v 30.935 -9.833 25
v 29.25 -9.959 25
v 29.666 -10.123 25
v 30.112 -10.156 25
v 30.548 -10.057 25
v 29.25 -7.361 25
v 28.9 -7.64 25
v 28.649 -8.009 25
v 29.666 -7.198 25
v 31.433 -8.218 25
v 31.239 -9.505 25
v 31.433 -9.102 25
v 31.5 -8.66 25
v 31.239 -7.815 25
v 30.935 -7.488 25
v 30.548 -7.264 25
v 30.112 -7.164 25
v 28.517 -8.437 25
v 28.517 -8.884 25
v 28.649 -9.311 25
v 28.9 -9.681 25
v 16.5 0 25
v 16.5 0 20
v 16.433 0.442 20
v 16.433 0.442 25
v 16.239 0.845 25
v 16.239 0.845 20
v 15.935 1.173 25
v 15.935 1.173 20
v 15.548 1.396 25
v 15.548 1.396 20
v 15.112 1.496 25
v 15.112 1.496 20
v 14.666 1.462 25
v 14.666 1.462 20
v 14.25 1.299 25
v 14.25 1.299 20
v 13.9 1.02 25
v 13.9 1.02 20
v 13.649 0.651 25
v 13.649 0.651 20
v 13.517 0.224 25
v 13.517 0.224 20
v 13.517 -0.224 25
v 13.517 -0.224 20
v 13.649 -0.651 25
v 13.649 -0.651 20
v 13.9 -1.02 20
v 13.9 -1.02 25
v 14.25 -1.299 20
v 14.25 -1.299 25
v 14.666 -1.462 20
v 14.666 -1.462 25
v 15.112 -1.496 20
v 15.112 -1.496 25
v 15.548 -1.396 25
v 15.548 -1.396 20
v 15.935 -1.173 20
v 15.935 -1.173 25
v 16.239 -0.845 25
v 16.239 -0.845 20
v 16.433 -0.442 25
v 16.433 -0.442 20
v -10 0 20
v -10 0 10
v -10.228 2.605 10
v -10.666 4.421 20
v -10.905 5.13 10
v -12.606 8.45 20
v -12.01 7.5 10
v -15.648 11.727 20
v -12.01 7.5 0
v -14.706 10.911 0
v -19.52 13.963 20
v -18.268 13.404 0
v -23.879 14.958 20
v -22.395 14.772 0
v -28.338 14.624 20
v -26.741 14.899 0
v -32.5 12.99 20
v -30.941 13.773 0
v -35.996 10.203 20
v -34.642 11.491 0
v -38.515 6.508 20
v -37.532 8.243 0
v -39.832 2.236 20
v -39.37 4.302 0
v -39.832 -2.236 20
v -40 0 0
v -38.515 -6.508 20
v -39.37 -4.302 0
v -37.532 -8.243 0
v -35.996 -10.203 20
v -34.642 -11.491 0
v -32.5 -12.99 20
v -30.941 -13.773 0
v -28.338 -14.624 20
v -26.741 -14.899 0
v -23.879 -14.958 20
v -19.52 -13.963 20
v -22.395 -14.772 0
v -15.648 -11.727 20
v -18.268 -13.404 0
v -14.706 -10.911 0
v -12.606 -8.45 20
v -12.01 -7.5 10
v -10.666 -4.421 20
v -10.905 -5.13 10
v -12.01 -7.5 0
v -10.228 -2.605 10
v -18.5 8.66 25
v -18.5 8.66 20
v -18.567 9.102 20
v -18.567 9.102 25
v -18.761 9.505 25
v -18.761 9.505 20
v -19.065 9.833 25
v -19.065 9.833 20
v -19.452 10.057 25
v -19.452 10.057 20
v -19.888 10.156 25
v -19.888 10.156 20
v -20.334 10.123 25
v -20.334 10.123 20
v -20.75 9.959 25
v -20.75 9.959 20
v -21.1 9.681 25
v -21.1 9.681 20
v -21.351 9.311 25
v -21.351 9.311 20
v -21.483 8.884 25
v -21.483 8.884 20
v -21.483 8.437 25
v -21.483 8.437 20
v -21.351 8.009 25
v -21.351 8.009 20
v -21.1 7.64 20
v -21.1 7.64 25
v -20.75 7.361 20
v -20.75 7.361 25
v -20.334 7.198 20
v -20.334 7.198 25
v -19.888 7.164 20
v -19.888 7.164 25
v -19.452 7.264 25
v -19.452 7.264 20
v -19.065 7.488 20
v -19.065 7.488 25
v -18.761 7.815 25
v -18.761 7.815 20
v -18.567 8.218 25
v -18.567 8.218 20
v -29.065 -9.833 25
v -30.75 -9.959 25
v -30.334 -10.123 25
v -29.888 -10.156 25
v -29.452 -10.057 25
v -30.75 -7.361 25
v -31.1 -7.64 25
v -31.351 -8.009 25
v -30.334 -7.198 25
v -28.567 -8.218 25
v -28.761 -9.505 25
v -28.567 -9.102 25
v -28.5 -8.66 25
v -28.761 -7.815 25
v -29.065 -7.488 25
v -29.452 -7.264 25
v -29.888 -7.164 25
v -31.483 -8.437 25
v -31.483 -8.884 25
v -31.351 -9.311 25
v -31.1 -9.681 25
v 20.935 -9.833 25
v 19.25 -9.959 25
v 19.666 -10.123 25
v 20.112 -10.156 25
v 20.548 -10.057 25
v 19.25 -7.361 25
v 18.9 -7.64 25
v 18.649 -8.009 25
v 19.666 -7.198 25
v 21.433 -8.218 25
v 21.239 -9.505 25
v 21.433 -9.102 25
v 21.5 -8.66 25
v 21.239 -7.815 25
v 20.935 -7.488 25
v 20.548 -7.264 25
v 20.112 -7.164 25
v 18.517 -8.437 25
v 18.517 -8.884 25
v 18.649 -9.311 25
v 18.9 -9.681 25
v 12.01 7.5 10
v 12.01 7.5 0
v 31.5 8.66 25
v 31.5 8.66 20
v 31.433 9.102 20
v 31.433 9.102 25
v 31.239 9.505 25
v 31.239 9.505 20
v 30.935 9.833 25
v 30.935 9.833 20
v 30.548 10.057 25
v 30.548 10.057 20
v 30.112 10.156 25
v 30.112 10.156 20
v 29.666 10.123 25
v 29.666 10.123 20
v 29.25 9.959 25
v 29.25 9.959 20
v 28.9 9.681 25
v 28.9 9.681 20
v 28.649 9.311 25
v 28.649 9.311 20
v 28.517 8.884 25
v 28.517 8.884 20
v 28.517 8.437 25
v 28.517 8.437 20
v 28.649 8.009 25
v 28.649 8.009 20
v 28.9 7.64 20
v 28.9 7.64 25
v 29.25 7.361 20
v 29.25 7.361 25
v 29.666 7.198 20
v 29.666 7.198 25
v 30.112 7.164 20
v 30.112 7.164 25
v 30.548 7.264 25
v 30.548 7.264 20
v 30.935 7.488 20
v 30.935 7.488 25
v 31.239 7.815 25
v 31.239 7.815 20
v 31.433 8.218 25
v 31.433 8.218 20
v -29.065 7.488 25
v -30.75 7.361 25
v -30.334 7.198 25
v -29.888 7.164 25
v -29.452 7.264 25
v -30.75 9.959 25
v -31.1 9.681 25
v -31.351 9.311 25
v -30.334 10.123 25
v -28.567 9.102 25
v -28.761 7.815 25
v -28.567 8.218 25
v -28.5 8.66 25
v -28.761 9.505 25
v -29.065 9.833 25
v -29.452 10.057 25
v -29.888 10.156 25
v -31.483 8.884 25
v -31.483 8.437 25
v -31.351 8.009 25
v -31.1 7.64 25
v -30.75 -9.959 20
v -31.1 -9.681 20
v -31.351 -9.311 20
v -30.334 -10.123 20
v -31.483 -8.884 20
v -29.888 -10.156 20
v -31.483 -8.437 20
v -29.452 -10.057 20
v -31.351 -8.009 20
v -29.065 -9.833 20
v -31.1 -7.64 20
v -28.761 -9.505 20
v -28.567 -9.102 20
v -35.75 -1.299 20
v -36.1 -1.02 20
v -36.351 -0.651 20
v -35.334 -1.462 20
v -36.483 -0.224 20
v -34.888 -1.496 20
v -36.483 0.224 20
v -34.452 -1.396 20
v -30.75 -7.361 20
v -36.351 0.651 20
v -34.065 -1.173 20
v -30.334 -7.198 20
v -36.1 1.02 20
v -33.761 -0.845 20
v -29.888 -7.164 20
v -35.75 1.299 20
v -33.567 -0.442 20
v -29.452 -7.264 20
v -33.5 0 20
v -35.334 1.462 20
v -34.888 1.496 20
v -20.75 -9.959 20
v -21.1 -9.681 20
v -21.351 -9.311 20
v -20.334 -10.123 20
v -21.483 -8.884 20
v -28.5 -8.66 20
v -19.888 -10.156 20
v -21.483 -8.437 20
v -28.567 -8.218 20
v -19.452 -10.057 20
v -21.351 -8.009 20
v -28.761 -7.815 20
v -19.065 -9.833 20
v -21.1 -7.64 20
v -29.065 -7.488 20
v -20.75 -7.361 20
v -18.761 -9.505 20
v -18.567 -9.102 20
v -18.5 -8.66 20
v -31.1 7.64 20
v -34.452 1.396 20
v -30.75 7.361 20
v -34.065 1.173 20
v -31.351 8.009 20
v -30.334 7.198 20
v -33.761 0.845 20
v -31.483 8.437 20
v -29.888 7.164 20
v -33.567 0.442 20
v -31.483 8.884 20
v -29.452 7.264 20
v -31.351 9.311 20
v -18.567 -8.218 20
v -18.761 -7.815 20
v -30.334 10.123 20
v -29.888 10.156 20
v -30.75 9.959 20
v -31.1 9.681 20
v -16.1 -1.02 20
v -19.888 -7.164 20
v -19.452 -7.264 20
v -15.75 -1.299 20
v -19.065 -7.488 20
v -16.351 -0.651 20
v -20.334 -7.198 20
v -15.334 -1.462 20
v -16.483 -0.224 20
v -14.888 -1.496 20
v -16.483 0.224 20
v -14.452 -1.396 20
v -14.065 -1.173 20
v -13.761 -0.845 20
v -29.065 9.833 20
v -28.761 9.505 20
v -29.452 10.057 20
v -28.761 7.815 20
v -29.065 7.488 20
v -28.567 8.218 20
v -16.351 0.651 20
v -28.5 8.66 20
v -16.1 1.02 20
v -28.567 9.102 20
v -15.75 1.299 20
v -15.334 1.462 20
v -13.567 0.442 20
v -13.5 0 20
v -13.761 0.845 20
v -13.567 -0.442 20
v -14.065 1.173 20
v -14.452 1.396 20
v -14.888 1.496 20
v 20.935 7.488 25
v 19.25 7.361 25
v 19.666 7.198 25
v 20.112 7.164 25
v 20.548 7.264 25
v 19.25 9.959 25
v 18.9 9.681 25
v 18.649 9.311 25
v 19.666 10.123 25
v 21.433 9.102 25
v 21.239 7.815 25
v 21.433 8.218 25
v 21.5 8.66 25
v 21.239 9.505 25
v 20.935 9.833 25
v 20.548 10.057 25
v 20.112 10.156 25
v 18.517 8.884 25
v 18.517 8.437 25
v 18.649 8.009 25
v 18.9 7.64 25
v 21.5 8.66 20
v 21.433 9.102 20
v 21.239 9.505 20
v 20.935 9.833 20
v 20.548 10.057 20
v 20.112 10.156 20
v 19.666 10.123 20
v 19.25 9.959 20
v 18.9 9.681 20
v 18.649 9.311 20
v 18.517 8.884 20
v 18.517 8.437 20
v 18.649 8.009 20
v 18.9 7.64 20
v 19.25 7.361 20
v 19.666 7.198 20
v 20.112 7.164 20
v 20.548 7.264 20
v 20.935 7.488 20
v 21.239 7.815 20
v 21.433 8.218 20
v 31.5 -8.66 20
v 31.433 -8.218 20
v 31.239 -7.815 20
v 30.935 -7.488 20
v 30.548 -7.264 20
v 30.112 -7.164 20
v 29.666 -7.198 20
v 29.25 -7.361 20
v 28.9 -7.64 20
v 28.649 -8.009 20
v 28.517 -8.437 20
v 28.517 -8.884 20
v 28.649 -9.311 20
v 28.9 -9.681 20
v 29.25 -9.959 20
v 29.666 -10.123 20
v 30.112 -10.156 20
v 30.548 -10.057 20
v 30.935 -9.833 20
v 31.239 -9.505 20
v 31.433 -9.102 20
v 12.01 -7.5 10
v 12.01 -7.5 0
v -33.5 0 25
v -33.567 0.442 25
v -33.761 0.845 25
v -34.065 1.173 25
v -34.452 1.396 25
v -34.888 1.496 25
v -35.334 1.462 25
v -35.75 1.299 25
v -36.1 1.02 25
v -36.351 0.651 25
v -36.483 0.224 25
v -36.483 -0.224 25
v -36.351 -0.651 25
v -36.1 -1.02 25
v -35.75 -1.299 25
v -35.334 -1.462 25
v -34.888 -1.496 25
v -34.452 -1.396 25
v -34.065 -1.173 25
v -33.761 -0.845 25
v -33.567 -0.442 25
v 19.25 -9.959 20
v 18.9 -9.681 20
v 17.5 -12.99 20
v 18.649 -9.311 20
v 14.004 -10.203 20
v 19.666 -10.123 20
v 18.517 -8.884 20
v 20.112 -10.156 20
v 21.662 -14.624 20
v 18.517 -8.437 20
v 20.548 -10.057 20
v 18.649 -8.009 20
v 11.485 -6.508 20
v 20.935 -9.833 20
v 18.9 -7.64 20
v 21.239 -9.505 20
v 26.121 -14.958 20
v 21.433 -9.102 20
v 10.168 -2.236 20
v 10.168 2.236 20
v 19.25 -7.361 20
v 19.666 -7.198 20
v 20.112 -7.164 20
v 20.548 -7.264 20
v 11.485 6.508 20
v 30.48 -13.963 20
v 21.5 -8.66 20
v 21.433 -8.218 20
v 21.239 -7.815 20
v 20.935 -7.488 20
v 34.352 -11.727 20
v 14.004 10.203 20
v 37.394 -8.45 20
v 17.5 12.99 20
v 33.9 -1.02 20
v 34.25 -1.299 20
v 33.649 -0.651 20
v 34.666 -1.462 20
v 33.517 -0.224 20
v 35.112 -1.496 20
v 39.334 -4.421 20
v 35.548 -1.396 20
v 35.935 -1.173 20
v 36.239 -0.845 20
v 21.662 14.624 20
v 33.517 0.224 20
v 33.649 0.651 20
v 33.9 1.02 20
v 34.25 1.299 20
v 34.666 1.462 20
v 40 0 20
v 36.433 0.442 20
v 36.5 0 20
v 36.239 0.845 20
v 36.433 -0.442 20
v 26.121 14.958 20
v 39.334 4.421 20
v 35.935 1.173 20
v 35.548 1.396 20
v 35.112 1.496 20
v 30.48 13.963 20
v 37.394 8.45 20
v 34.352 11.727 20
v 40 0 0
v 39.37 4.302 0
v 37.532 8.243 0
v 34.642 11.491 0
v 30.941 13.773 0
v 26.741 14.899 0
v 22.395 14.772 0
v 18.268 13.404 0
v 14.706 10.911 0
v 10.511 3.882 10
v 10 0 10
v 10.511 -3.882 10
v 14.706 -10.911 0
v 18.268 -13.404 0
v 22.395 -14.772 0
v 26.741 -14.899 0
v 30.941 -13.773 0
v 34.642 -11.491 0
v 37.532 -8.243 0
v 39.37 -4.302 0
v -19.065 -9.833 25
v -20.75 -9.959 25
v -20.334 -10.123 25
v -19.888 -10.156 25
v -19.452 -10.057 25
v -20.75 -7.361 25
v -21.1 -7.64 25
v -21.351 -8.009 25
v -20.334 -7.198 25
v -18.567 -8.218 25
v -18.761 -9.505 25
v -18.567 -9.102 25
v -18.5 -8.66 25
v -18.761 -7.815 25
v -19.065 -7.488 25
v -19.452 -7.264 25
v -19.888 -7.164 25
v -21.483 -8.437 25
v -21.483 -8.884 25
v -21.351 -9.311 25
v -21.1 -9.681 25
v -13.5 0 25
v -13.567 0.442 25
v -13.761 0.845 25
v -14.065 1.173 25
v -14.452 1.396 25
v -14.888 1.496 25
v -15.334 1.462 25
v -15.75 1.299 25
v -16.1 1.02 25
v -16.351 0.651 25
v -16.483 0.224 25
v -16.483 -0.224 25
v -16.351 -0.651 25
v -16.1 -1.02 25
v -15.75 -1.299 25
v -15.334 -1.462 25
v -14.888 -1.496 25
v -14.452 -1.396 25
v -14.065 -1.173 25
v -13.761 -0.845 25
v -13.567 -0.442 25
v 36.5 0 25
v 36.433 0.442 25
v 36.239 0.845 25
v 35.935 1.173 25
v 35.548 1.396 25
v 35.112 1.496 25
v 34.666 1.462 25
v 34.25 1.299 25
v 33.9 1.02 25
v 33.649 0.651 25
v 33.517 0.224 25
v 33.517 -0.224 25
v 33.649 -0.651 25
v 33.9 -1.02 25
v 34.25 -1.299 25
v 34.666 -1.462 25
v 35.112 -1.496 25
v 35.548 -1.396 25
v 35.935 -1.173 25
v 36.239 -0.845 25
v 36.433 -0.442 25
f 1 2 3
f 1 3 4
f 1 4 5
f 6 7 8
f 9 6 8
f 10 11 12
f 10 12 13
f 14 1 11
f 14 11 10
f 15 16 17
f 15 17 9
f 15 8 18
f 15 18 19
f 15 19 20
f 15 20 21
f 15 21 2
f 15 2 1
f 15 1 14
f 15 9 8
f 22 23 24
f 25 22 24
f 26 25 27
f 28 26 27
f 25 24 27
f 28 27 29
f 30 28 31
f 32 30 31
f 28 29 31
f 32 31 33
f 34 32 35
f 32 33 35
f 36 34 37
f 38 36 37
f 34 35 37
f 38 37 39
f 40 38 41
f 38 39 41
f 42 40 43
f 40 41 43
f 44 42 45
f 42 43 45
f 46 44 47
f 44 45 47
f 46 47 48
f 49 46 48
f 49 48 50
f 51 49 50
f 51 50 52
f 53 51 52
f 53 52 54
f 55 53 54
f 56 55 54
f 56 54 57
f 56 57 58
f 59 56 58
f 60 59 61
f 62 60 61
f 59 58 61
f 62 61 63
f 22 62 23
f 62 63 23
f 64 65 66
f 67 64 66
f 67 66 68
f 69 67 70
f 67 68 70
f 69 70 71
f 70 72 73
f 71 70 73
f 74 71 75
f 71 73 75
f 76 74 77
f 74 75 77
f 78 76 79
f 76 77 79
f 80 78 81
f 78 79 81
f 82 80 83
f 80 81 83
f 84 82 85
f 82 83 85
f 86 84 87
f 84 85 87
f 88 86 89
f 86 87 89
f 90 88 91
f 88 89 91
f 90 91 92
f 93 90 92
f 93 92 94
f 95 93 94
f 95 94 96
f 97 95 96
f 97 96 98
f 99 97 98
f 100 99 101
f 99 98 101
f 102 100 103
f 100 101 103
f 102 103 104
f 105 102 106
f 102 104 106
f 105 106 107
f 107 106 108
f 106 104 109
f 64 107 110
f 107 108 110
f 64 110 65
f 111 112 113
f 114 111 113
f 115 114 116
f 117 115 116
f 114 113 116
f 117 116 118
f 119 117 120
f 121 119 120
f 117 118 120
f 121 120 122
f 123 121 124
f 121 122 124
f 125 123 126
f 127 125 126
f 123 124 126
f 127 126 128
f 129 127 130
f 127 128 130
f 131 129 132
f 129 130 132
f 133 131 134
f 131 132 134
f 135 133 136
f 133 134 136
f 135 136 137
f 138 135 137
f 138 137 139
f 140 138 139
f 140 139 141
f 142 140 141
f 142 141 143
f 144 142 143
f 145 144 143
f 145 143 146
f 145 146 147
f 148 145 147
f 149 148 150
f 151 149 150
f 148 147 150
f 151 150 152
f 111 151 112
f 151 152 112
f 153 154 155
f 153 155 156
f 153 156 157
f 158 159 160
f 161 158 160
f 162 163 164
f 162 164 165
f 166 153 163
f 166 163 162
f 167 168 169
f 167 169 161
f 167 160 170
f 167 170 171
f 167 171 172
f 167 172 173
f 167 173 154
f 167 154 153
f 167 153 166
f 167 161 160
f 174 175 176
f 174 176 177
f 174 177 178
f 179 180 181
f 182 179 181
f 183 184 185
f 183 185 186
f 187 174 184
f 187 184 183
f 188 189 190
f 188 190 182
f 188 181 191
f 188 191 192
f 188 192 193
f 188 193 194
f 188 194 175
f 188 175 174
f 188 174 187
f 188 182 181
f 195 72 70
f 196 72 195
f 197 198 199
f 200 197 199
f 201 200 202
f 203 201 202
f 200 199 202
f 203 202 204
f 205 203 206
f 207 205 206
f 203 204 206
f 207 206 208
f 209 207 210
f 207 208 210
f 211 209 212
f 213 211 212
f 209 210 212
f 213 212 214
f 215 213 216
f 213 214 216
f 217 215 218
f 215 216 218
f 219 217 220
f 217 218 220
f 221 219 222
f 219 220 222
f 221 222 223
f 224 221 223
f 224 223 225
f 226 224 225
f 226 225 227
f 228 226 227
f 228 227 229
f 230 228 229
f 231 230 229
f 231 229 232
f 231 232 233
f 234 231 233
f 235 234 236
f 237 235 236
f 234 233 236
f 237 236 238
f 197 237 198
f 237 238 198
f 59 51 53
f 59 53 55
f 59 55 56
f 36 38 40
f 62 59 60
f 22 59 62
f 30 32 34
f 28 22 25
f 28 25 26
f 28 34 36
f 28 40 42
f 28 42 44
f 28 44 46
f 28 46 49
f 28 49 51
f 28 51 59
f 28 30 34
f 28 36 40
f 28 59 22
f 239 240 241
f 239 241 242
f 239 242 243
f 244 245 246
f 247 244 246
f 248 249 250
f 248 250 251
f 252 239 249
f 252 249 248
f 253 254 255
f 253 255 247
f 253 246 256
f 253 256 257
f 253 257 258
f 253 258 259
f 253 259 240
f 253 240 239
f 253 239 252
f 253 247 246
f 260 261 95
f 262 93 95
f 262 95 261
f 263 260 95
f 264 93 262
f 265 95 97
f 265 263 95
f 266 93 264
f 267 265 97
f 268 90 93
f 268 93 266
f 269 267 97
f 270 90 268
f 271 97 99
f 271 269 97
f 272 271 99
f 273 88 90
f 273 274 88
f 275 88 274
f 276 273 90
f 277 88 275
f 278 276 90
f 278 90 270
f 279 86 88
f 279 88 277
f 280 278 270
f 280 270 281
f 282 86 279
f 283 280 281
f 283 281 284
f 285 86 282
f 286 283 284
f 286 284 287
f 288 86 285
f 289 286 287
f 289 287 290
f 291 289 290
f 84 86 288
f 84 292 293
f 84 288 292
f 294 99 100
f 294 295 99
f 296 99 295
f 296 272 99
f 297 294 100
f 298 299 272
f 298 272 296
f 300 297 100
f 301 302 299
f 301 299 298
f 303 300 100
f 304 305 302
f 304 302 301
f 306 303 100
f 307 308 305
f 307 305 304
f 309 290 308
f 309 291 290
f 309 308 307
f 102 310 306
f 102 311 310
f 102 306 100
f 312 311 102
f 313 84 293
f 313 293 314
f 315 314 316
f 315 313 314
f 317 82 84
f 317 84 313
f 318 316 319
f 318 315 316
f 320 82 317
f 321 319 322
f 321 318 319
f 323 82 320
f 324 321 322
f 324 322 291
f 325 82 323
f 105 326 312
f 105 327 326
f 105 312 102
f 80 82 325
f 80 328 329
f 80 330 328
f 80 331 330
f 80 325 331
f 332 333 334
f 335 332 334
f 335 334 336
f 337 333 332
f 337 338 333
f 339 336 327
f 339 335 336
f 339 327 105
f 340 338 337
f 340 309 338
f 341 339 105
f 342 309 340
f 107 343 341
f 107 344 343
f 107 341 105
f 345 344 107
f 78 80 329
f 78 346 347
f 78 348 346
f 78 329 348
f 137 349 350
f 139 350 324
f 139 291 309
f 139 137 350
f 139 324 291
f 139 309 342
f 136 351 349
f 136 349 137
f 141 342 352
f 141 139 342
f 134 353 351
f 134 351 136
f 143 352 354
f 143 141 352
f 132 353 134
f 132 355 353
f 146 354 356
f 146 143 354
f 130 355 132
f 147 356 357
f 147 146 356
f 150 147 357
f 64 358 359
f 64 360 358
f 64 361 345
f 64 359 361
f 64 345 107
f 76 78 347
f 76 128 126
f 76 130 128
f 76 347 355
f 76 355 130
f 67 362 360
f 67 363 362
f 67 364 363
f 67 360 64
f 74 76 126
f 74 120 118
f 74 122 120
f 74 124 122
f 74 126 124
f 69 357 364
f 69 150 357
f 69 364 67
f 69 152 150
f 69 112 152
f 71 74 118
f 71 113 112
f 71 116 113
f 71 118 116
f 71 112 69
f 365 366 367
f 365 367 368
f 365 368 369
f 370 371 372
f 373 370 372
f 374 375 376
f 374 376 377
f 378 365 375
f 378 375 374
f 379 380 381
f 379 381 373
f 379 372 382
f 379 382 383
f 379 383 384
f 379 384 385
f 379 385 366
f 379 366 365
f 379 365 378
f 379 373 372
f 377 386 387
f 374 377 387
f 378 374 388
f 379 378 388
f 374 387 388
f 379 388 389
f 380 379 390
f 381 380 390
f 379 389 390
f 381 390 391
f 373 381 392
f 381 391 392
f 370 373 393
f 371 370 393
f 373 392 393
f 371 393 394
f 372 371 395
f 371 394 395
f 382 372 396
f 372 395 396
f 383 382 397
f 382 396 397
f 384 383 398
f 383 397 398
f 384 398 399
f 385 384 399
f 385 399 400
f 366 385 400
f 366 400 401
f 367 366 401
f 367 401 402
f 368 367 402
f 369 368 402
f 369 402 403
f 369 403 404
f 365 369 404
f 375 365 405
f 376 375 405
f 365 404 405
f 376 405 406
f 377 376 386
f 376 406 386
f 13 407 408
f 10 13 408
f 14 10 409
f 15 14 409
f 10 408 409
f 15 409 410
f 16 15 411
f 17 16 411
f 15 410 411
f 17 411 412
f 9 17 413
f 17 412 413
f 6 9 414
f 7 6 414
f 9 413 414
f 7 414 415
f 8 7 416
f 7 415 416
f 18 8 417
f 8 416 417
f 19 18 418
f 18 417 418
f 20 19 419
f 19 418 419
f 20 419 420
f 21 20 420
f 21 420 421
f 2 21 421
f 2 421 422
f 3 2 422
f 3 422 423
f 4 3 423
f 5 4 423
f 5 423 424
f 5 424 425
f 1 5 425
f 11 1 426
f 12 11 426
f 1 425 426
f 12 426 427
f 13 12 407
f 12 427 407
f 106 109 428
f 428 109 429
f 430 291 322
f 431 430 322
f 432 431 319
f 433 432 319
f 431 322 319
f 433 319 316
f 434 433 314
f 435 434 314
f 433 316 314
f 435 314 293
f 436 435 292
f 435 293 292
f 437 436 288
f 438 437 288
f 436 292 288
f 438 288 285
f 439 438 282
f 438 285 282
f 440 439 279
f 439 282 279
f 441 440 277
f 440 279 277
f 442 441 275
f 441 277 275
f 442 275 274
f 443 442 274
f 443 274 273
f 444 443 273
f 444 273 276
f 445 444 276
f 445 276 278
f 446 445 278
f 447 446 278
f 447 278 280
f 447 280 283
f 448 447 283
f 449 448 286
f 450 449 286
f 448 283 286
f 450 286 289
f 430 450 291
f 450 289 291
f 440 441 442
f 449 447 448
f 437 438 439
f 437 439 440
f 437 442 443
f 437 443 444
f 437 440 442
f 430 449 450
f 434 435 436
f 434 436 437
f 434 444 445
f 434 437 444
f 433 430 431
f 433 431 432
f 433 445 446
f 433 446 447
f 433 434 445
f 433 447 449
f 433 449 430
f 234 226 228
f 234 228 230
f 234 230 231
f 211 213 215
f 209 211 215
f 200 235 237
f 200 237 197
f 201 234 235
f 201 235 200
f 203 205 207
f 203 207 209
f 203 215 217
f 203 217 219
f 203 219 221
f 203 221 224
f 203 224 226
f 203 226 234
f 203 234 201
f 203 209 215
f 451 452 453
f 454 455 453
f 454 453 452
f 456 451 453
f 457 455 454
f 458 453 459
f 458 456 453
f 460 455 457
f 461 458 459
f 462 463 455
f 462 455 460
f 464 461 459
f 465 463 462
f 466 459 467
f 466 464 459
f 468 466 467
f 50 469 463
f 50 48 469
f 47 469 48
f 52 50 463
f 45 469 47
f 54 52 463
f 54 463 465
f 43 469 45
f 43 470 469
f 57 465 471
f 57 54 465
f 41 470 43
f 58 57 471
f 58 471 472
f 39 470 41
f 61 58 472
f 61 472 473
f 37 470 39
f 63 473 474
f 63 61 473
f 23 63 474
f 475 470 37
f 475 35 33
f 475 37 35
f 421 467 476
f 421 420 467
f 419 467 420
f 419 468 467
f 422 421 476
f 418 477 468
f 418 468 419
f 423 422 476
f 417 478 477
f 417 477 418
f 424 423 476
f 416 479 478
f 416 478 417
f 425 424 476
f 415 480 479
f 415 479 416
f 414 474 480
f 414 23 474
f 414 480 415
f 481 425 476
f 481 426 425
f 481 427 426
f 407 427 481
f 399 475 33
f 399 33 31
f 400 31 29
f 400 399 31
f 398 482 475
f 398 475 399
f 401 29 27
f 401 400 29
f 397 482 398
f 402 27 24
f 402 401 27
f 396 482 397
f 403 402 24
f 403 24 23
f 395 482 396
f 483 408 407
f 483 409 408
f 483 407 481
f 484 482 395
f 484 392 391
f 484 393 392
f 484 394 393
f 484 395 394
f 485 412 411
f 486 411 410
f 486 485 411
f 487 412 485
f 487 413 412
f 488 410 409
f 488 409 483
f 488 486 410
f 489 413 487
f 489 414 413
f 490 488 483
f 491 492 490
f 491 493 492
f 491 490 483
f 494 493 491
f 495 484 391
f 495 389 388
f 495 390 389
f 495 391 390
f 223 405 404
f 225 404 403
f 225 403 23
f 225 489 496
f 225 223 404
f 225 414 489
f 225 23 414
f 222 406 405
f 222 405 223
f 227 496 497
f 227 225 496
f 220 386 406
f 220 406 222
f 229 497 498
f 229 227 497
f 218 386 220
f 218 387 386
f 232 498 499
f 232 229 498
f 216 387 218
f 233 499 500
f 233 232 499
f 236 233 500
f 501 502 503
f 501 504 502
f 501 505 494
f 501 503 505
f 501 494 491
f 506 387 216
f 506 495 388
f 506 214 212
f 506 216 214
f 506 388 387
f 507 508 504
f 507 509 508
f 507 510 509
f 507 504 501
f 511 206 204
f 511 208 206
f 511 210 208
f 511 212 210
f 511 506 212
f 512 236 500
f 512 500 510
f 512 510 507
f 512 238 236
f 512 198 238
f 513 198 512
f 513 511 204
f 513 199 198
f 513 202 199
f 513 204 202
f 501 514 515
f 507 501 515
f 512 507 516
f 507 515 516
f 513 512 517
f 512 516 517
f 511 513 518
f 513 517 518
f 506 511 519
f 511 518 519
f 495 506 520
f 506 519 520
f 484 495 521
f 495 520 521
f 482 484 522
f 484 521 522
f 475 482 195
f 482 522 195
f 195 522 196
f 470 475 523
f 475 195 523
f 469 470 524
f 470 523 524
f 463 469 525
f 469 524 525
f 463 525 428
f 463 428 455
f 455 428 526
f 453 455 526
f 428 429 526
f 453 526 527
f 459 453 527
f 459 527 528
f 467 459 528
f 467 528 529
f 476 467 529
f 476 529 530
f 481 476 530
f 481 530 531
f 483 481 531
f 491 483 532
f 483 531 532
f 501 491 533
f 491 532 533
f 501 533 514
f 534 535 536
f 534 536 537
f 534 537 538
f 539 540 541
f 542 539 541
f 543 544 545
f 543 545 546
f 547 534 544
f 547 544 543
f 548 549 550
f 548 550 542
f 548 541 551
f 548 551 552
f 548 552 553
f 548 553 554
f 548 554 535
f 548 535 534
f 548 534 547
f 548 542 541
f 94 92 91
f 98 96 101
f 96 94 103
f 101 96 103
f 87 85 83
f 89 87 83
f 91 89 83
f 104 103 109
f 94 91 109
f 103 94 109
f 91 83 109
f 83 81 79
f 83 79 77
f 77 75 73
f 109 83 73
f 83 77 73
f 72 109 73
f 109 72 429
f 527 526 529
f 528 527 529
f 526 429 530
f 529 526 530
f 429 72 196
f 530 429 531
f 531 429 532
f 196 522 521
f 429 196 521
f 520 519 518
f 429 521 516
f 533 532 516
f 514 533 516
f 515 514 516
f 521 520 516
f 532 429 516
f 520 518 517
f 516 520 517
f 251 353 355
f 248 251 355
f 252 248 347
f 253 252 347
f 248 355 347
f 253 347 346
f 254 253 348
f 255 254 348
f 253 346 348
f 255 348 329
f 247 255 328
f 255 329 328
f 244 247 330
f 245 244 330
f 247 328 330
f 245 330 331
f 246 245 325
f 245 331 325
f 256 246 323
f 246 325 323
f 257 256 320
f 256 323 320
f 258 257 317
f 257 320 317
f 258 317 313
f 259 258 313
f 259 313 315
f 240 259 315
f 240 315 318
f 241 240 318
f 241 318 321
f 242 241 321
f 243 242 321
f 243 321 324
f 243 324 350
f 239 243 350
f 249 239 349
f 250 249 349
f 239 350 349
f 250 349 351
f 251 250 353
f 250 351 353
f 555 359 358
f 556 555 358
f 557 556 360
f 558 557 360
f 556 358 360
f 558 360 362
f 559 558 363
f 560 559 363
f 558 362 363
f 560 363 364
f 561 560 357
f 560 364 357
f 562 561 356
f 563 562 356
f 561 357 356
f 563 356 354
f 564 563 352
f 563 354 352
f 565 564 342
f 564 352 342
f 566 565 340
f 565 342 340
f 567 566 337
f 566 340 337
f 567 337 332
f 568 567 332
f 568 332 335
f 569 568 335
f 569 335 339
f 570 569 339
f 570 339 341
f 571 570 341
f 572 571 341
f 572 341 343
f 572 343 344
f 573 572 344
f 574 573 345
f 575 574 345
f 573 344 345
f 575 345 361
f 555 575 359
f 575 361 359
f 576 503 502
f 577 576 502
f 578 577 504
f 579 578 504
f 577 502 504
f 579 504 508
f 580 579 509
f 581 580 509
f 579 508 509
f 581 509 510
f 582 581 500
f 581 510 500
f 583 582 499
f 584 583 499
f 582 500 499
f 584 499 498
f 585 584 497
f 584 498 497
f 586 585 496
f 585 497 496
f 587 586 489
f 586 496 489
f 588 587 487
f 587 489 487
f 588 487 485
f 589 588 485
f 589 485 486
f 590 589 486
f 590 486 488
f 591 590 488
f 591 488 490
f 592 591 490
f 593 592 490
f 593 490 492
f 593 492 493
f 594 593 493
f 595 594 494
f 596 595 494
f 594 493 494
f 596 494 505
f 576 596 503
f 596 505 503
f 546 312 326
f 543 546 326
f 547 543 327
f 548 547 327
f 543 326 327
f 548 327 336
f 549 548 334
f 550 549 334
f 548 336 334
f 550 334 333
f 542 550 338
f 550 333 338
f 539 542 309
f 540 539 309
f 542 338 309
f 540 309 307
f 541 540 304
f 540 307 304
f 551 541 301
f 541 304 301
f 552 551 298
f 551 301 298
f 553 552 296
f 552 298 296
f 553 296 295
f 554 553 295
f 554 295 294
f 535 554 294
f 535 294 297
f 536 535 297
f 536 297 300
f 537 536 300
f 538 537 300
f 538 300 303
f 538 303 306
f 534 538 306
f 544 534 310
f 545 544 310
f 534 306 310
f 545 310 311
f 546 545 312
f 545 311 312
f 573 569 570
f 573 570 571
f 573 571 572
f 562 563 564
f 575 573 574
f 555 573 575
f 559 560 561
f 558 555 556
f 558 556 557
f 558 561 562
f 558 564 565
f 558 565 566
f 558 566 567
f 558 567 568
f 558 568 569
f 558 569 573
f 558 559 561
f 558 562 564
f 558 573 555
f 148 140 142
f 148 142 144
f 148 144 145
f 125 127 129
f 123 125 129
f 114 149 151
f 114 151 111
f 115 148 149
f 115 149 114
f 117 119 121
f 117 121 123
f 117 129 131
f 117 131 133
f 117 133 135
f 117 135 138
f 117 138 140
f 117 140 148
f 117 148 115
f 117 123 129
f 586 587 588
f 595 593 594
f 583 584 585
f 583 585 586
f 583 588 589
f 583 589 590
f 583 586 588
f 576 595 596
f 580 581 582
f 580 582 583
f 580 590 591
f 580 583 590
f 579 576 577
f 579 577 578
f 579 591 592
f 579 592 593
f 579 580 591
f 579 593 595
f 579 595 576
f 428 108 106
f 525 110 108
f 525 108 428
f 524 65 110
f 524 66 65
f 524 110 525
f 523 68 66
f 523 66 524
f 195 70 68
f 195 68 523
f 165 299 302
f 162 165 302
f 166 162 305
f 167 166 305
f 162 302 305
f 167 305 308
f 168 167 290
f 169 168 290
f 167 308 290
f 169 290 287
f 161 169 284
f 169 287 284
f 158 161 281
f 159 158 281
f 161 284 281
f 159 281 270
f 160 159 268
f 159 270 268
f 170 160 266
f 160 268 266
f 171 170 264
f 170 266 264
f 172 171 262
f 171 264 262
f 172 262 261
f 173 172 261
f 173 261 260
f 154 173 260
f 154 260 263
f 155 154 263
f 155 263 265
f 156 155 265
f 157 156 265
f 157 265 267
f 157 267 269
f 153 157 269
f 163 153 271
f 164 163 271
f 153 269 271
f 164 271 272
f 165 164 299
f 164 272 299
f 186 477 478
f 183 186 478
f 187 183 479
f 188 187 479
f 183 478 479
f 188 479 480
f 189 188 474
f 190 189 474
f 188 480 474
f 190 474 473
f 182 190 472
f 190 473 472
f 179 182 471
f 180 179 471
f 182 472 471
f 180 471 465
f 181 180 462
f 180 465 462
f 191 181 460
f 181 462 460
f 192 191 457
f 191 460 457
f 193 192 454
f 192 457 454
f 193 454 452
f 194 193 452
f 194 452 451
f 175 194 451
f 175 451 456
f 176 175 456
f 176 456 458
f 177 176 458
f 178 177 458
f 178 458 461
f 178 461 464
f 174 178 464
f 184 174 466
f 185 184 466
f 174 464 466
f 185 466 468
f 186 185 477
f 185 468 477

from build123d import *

# Parameters (mm, degrees)
SKETCH1_R             = 15
BOSS_EXTRUDE1_DEPTH   = 20
BOSS_EXTRUDE1_2_DEPTH = 20
SKETCH2_R             = 1.5
BOSS_EXTRUDE2_DEPTH   = 5
SKETCH3_W             = 50
SKETCH3_H             = 15
BOSS_EXTRUDE3_DEPTH   = 10


with BuildPart() as part:
    # Sketch1 → Boss-Extrude1 (new body)
    with BuildSketch(Plane.XY):
        with Locations((25, 0)):
            Circle(SKETCH1_R)
    extrude(amount=BOSS_EXTRUDE1_DEPTH)



with BuildPart() as body_2:
    # Sketch1 → Boss-Extrude1 2 (new body)
    with BuildSketch(Plane.XY):
        with Locations((-25, 0)):
            Circle(SKETCH1_R)
    extrude(amount=BOSS_EXTRUDE1_2_DEPTH)


with BuildPart() as part_1:
    add(part.part)

    add(body_2.part)  # Boss-Extrude2 merges body 2
    # Sketch2 → Boss-Extrude2 (add)
    with BuildSketch(Plane.XY.offset(20)):
        with Locations((35, 0)):
            Circle(SKETCH2_R)
        with Locations((30, -8.660254038)):
            Circle(SKETCH2_R)
        with Locations((20, -8.660254038)):
            Circle(SKETCH2_R)
        with Locations((15, 0)):
            Circle(SKETCH2_R)
        with Locations((20, 8.660254038)):
            Circle(SKETCH2_R)
        with Locations((30, 8.660254038)):
            Circle(SKETCH2_R)
        with Locations((-15, 0)):
            Circle(SKETCH2_R)
        with Locations((-20, -8.660254038)):
            Circle(SKETCH2_R)
        with Locations((-30, -8.660254038)):
            Circle(SKETCH2_R)
        with Locations((-35, 0)):
            Circle(SKETCH2_R)
        with Locations((-30, 8.660254038)):
            Circle(SKETCH2_R)
        with Locations((-20, 8.660254038)):
            Circle(SKETCH2_R)
    extrude(amount=BOSS_EXTRUDE2_DEPTH)

    # Sketch3 → Boss-Extrude3 (add)
    with BuildSketch(Plane.XY):
        Rectangle(SKETCH3_W, SKETCH3_H)
    extrude(amount=BOSS_EXTRUDE3_DEPTH)


solid = part_1.part
